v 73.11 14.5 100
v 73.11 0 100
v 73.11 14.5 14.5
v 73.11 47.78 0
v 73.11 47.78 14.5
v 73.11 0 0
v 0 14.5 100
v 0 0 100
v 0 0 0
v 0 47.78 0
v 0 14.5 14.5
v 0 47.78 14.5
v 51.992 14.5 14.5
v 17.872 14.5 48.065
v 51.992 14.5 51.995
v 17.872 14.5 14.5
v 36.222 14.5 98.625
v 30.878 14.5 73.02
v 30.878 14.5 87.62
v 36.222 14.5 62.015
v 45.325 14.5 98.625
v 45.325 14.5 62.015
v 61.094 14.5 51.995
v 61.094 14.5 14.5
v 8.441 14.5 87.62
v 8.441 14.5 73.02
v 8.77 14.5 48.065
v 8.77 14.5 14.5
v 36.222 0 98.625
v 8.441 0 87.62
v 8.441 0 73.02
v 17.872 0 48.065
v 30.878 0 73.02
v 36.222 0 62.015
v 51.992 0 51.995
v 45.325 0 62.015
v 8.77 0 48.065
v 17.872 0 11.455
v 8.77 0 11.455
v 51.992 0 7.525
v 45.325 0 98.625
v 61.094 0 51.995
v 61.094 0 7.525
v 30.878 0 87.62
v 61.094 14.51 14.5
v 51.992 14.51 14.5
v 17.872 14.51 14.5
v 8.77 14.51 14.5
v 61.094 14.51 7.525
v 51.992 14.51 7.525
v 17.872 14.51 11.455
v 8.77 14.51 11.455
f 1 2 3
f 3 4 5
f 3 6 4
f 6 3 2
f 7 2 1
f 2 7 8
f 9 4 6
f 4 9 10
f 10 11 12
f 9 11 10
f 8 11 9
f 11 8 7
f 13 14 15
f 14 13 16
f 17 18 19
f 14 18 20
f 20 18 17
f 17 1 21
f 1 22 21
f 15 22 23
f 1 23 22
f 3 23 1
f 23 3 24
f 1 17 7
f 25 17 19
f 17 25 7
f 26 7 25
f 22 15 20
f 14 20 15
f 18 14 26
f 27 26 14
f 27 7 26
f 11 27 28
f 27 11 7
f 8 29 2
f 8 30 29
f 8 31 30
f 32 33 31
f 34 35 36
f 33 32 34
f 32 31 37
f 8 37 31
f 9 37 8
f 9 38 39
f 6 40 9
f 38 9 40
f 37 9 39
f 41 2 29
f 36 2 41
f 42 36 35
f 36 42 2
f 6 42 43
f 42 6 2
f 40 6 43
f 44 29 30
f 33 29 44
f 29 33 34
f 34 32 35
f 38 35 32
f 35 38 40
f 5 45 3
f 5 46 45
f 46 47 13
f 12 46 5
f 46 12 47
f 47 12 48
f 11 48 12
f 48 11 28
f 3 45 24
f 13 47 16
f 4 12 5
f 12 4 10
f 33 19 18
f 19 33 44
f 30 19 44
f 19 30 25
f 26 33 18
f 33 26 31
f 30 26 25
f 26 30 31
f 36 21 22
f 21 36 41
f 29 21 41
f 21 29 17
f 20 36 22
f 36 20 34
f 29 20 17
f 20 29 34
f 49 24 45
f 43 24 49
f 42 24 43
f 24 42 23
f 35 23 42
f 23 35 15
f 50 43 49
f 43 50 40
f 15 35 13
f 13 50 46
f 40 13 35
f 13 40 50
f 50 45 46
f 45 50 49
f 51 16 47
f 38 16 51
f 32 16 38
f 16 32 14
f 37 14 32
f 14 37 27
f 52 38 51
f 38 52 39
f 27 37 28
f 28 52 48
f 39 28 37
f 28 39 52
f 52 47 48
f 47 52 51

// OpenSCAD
// L-shaped bookend
// Derived sizes: width=73.11 (X), depth=47.78 (Y), height=100.0 (Z)
// Right view (view_1) defines the L-profile in YZ plane, extruded along X.
// Front view (view_2) defines four rectangular through-cutouts on the vertical face, cut along Y.

// --- Parameters ---
width = 73.11;      // X
depth = 47.78;      // Y
height = 100.0;     // Z

// L-profile parameters derived from right view polygon
// Right view: u maps to +Y, v maps to -Z
// Polygon points (u,v) -> (Y, Z):
// (0.0462, 0.0157) -> Y=2.21, Z=98.43
// (0.0462, 0.9822) -> Y=2.21, Z=1.78
// (0.9394, 0.9866) -> Y=44.88, Z=1.34
// (0.9441, 0.8594) -> Y=45.11, Z=14.06
// (0.3024, 0.855)  -> Y=14.45, Z=14.50
// (0.3116, 0.0157) -> Y=14.89, Z=98.43

// Simplified L-profile:
// Vertical backplate: Y from 0 to backplate_depth, Z from 0 to height
// Horizontal base: Y from 0 to depth, Z from 0 to base_height
// The inner corner is at (Y=inner_y, Z=inner_z)

backplate_depth = 14.5;  // Y extent of vertical part
base_height = 14.5;      // Z extent of horizontal part

// Cutout parameters from front view (view_2)
// Front view: u maps to +X, v maps to -Z
// Outer profile spans u: 0.0302-0.9665, v: 0.0133-0.9823
// Map to physical: X = u * width, Z = (1-v) * height

// Cutout 1 (contour_8): upper-left window
// center_view_normalized: (0.2689, 0.1968), size: (0.3069, 0.146)
c1_cx = 0.2689 * width;
c1_cz = (1.0 - 0.1968) * height;
c1_w = 0.3069 * width;
c1_h = 0.146 * height;

// Cutout 2 (contour_10): upper-right vertical slot
// center_view_normalized: (0.5577, 0.1968), size: (0.1245, 0.3661)
c2_cx = 0.5577 * width;
c2_cz = (1.0 - 0.1968) * height;
c2_w = 0.1245 * width;
c2_h = 0.3661 * height;

// Cutout 3 (contour_6): lower-right vertical slot
// center_view_normalized: (0.7734, 0.7024), size: (0.1245, 0.4447)
c3_cx = 0.7734 * width;
c3_cz = (1.0 - 0.7024) * height;
c3_w = 0.1245 * width;
c3_h = 0.4447 * height;

// Cutout 4 (contour_4): lower-left vertical slot
// center_view_normalized: (0.1822, 0.7024), size: (0.1245, 0.3661)
c4_cx = 0.1822 * width;
c4_cz = (1.0 - 0.7024) * height;
c4_w = 0.1245 * width;
c4_h = 0.3661 * height;

eps = 0.01;

// --- Modules ---

module l_profile() {
    // L-shape in YZ plane, extruded along X
    // Vertical backplate: Y [0, backplate_depth], Z [0, height]
    // Horizontal base: Y [0, depth], Z [0, base_height]
    // Union of two boxes
    translate([0, 0, 0])
        cube([width, backplate_depth, height]);
    translate([0, 0, 0])
        cube([width, depth, base_height]);
}

module cutout_cutter(cx, cz, w, h) {
    // Rectangular through-cutout on vertical face (front face at Y=0)
    // Cut along Y axis. The cutter spans Y from -eps to backplate_depth+eps
    // Centered at (cx, cz) in XZ plane
    translate([cx - w/2, -eps, cz - h/2])
        cube([w, backplate_depth + 2*eps, h]);
}

// --- Main Design ---

difference() {
    l_profile();
    
    // Cutout 1: upper-left window
    cutout_cutter(c1_cx, c1_cz, c1_w, c1_h);
    
    // Cutout 2: upper-right vertical slot
    cutout_cutter(c2_cx, c2_cz, c2_w, c2_h);
    
    // Cutout 3: lower-right vertical slot
    cutout_cutter(c3_cx, c3_cz, c3_w, c3_h);
    
    // Cutout 4: lower-left vertical slot
    cutout_cutter(c4_cx, c4_cz, c4_w, c4_h);
}
